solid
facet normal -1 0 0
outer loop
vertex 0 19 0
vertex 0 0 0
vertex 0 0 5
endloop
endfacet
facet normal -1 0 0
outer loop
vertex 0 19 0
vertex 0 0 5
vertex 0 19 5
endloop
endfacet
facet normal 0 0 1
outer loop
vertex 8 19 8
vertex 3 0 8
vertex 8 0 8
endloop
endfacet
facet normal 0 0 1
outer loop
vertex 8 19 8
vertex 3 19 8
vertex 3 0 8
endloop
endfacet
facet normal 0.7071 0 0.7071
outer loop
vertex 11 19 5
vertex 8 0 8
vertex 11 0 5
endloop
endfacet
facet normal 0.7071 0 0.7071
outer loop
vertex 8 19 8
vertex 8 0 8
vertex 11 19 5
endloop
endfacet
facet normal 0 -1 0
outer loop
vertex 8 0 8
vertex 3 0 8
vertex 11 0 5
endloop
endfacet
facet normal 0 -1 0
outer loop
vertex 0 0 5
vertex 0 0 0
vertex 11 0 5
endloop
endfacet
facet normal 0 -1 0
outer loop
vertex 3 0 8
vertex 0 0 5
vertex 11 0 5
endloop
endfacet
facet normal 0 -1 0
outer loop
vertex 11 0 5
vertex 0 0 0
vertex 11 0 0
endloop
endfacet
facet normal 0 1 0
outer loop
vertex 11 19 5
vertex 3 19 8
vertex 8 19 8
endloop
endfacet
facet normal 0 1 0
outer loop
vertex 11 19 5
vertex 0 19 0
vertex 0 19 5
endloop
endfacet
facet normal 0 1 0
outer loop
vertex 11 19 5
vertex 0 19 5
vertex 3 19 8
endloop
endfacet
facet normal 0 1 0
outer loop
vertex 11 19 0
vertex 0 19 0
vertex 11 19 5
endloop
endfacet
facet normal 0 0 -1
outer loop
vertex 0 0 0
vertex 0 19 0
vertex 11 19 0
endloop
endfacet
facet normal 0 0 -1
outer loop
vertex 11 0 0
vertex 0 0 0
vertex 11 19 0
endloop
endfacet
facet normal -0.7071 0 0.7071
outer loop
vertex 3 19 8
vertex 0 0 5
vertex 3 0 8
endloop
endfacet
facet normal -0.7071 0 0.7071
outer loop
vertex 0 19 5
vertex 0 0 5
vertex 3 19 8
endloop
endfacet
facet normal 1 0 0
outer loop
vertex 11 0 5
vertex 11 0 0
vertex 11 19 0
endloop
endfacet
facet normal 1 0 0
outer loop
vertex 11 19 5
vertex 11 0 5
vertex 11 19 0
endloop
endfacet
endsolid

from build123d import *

# Parameters (mm, degrees)
BOX_W           = 11
BOX_H           = 19
BOX_DEPTH       = 8
CHAMFER_SIZE    = 3
CHAMFER002_SIZE = 3


with BuildPart() as part:
    # Box → Box (new body)
    with BuildSketch(Plane.XY):
        with Locations((5.5, 9.5)):
            Rectangle(BOX_W, BOX_H)
    extrude(amount=BOX_DEPTH)

    # Chamfer
    chamfer_edges = [part.edges().sort_by_distance(p)[0] for p in [
        (11, 9.5, 8),
    ]]
    chamfer(chamfer_edges, length=CHAMFER_SIZE)

    # Chamfer002
    chamfer002_edges = [part.edges().sort_by_distance(p)[0] for p in [
        (0, 9.5, 8),
    ]]
    chamfer(chamfer002_edges, length=CHAMFER002_SIZE)


solid = part.part
